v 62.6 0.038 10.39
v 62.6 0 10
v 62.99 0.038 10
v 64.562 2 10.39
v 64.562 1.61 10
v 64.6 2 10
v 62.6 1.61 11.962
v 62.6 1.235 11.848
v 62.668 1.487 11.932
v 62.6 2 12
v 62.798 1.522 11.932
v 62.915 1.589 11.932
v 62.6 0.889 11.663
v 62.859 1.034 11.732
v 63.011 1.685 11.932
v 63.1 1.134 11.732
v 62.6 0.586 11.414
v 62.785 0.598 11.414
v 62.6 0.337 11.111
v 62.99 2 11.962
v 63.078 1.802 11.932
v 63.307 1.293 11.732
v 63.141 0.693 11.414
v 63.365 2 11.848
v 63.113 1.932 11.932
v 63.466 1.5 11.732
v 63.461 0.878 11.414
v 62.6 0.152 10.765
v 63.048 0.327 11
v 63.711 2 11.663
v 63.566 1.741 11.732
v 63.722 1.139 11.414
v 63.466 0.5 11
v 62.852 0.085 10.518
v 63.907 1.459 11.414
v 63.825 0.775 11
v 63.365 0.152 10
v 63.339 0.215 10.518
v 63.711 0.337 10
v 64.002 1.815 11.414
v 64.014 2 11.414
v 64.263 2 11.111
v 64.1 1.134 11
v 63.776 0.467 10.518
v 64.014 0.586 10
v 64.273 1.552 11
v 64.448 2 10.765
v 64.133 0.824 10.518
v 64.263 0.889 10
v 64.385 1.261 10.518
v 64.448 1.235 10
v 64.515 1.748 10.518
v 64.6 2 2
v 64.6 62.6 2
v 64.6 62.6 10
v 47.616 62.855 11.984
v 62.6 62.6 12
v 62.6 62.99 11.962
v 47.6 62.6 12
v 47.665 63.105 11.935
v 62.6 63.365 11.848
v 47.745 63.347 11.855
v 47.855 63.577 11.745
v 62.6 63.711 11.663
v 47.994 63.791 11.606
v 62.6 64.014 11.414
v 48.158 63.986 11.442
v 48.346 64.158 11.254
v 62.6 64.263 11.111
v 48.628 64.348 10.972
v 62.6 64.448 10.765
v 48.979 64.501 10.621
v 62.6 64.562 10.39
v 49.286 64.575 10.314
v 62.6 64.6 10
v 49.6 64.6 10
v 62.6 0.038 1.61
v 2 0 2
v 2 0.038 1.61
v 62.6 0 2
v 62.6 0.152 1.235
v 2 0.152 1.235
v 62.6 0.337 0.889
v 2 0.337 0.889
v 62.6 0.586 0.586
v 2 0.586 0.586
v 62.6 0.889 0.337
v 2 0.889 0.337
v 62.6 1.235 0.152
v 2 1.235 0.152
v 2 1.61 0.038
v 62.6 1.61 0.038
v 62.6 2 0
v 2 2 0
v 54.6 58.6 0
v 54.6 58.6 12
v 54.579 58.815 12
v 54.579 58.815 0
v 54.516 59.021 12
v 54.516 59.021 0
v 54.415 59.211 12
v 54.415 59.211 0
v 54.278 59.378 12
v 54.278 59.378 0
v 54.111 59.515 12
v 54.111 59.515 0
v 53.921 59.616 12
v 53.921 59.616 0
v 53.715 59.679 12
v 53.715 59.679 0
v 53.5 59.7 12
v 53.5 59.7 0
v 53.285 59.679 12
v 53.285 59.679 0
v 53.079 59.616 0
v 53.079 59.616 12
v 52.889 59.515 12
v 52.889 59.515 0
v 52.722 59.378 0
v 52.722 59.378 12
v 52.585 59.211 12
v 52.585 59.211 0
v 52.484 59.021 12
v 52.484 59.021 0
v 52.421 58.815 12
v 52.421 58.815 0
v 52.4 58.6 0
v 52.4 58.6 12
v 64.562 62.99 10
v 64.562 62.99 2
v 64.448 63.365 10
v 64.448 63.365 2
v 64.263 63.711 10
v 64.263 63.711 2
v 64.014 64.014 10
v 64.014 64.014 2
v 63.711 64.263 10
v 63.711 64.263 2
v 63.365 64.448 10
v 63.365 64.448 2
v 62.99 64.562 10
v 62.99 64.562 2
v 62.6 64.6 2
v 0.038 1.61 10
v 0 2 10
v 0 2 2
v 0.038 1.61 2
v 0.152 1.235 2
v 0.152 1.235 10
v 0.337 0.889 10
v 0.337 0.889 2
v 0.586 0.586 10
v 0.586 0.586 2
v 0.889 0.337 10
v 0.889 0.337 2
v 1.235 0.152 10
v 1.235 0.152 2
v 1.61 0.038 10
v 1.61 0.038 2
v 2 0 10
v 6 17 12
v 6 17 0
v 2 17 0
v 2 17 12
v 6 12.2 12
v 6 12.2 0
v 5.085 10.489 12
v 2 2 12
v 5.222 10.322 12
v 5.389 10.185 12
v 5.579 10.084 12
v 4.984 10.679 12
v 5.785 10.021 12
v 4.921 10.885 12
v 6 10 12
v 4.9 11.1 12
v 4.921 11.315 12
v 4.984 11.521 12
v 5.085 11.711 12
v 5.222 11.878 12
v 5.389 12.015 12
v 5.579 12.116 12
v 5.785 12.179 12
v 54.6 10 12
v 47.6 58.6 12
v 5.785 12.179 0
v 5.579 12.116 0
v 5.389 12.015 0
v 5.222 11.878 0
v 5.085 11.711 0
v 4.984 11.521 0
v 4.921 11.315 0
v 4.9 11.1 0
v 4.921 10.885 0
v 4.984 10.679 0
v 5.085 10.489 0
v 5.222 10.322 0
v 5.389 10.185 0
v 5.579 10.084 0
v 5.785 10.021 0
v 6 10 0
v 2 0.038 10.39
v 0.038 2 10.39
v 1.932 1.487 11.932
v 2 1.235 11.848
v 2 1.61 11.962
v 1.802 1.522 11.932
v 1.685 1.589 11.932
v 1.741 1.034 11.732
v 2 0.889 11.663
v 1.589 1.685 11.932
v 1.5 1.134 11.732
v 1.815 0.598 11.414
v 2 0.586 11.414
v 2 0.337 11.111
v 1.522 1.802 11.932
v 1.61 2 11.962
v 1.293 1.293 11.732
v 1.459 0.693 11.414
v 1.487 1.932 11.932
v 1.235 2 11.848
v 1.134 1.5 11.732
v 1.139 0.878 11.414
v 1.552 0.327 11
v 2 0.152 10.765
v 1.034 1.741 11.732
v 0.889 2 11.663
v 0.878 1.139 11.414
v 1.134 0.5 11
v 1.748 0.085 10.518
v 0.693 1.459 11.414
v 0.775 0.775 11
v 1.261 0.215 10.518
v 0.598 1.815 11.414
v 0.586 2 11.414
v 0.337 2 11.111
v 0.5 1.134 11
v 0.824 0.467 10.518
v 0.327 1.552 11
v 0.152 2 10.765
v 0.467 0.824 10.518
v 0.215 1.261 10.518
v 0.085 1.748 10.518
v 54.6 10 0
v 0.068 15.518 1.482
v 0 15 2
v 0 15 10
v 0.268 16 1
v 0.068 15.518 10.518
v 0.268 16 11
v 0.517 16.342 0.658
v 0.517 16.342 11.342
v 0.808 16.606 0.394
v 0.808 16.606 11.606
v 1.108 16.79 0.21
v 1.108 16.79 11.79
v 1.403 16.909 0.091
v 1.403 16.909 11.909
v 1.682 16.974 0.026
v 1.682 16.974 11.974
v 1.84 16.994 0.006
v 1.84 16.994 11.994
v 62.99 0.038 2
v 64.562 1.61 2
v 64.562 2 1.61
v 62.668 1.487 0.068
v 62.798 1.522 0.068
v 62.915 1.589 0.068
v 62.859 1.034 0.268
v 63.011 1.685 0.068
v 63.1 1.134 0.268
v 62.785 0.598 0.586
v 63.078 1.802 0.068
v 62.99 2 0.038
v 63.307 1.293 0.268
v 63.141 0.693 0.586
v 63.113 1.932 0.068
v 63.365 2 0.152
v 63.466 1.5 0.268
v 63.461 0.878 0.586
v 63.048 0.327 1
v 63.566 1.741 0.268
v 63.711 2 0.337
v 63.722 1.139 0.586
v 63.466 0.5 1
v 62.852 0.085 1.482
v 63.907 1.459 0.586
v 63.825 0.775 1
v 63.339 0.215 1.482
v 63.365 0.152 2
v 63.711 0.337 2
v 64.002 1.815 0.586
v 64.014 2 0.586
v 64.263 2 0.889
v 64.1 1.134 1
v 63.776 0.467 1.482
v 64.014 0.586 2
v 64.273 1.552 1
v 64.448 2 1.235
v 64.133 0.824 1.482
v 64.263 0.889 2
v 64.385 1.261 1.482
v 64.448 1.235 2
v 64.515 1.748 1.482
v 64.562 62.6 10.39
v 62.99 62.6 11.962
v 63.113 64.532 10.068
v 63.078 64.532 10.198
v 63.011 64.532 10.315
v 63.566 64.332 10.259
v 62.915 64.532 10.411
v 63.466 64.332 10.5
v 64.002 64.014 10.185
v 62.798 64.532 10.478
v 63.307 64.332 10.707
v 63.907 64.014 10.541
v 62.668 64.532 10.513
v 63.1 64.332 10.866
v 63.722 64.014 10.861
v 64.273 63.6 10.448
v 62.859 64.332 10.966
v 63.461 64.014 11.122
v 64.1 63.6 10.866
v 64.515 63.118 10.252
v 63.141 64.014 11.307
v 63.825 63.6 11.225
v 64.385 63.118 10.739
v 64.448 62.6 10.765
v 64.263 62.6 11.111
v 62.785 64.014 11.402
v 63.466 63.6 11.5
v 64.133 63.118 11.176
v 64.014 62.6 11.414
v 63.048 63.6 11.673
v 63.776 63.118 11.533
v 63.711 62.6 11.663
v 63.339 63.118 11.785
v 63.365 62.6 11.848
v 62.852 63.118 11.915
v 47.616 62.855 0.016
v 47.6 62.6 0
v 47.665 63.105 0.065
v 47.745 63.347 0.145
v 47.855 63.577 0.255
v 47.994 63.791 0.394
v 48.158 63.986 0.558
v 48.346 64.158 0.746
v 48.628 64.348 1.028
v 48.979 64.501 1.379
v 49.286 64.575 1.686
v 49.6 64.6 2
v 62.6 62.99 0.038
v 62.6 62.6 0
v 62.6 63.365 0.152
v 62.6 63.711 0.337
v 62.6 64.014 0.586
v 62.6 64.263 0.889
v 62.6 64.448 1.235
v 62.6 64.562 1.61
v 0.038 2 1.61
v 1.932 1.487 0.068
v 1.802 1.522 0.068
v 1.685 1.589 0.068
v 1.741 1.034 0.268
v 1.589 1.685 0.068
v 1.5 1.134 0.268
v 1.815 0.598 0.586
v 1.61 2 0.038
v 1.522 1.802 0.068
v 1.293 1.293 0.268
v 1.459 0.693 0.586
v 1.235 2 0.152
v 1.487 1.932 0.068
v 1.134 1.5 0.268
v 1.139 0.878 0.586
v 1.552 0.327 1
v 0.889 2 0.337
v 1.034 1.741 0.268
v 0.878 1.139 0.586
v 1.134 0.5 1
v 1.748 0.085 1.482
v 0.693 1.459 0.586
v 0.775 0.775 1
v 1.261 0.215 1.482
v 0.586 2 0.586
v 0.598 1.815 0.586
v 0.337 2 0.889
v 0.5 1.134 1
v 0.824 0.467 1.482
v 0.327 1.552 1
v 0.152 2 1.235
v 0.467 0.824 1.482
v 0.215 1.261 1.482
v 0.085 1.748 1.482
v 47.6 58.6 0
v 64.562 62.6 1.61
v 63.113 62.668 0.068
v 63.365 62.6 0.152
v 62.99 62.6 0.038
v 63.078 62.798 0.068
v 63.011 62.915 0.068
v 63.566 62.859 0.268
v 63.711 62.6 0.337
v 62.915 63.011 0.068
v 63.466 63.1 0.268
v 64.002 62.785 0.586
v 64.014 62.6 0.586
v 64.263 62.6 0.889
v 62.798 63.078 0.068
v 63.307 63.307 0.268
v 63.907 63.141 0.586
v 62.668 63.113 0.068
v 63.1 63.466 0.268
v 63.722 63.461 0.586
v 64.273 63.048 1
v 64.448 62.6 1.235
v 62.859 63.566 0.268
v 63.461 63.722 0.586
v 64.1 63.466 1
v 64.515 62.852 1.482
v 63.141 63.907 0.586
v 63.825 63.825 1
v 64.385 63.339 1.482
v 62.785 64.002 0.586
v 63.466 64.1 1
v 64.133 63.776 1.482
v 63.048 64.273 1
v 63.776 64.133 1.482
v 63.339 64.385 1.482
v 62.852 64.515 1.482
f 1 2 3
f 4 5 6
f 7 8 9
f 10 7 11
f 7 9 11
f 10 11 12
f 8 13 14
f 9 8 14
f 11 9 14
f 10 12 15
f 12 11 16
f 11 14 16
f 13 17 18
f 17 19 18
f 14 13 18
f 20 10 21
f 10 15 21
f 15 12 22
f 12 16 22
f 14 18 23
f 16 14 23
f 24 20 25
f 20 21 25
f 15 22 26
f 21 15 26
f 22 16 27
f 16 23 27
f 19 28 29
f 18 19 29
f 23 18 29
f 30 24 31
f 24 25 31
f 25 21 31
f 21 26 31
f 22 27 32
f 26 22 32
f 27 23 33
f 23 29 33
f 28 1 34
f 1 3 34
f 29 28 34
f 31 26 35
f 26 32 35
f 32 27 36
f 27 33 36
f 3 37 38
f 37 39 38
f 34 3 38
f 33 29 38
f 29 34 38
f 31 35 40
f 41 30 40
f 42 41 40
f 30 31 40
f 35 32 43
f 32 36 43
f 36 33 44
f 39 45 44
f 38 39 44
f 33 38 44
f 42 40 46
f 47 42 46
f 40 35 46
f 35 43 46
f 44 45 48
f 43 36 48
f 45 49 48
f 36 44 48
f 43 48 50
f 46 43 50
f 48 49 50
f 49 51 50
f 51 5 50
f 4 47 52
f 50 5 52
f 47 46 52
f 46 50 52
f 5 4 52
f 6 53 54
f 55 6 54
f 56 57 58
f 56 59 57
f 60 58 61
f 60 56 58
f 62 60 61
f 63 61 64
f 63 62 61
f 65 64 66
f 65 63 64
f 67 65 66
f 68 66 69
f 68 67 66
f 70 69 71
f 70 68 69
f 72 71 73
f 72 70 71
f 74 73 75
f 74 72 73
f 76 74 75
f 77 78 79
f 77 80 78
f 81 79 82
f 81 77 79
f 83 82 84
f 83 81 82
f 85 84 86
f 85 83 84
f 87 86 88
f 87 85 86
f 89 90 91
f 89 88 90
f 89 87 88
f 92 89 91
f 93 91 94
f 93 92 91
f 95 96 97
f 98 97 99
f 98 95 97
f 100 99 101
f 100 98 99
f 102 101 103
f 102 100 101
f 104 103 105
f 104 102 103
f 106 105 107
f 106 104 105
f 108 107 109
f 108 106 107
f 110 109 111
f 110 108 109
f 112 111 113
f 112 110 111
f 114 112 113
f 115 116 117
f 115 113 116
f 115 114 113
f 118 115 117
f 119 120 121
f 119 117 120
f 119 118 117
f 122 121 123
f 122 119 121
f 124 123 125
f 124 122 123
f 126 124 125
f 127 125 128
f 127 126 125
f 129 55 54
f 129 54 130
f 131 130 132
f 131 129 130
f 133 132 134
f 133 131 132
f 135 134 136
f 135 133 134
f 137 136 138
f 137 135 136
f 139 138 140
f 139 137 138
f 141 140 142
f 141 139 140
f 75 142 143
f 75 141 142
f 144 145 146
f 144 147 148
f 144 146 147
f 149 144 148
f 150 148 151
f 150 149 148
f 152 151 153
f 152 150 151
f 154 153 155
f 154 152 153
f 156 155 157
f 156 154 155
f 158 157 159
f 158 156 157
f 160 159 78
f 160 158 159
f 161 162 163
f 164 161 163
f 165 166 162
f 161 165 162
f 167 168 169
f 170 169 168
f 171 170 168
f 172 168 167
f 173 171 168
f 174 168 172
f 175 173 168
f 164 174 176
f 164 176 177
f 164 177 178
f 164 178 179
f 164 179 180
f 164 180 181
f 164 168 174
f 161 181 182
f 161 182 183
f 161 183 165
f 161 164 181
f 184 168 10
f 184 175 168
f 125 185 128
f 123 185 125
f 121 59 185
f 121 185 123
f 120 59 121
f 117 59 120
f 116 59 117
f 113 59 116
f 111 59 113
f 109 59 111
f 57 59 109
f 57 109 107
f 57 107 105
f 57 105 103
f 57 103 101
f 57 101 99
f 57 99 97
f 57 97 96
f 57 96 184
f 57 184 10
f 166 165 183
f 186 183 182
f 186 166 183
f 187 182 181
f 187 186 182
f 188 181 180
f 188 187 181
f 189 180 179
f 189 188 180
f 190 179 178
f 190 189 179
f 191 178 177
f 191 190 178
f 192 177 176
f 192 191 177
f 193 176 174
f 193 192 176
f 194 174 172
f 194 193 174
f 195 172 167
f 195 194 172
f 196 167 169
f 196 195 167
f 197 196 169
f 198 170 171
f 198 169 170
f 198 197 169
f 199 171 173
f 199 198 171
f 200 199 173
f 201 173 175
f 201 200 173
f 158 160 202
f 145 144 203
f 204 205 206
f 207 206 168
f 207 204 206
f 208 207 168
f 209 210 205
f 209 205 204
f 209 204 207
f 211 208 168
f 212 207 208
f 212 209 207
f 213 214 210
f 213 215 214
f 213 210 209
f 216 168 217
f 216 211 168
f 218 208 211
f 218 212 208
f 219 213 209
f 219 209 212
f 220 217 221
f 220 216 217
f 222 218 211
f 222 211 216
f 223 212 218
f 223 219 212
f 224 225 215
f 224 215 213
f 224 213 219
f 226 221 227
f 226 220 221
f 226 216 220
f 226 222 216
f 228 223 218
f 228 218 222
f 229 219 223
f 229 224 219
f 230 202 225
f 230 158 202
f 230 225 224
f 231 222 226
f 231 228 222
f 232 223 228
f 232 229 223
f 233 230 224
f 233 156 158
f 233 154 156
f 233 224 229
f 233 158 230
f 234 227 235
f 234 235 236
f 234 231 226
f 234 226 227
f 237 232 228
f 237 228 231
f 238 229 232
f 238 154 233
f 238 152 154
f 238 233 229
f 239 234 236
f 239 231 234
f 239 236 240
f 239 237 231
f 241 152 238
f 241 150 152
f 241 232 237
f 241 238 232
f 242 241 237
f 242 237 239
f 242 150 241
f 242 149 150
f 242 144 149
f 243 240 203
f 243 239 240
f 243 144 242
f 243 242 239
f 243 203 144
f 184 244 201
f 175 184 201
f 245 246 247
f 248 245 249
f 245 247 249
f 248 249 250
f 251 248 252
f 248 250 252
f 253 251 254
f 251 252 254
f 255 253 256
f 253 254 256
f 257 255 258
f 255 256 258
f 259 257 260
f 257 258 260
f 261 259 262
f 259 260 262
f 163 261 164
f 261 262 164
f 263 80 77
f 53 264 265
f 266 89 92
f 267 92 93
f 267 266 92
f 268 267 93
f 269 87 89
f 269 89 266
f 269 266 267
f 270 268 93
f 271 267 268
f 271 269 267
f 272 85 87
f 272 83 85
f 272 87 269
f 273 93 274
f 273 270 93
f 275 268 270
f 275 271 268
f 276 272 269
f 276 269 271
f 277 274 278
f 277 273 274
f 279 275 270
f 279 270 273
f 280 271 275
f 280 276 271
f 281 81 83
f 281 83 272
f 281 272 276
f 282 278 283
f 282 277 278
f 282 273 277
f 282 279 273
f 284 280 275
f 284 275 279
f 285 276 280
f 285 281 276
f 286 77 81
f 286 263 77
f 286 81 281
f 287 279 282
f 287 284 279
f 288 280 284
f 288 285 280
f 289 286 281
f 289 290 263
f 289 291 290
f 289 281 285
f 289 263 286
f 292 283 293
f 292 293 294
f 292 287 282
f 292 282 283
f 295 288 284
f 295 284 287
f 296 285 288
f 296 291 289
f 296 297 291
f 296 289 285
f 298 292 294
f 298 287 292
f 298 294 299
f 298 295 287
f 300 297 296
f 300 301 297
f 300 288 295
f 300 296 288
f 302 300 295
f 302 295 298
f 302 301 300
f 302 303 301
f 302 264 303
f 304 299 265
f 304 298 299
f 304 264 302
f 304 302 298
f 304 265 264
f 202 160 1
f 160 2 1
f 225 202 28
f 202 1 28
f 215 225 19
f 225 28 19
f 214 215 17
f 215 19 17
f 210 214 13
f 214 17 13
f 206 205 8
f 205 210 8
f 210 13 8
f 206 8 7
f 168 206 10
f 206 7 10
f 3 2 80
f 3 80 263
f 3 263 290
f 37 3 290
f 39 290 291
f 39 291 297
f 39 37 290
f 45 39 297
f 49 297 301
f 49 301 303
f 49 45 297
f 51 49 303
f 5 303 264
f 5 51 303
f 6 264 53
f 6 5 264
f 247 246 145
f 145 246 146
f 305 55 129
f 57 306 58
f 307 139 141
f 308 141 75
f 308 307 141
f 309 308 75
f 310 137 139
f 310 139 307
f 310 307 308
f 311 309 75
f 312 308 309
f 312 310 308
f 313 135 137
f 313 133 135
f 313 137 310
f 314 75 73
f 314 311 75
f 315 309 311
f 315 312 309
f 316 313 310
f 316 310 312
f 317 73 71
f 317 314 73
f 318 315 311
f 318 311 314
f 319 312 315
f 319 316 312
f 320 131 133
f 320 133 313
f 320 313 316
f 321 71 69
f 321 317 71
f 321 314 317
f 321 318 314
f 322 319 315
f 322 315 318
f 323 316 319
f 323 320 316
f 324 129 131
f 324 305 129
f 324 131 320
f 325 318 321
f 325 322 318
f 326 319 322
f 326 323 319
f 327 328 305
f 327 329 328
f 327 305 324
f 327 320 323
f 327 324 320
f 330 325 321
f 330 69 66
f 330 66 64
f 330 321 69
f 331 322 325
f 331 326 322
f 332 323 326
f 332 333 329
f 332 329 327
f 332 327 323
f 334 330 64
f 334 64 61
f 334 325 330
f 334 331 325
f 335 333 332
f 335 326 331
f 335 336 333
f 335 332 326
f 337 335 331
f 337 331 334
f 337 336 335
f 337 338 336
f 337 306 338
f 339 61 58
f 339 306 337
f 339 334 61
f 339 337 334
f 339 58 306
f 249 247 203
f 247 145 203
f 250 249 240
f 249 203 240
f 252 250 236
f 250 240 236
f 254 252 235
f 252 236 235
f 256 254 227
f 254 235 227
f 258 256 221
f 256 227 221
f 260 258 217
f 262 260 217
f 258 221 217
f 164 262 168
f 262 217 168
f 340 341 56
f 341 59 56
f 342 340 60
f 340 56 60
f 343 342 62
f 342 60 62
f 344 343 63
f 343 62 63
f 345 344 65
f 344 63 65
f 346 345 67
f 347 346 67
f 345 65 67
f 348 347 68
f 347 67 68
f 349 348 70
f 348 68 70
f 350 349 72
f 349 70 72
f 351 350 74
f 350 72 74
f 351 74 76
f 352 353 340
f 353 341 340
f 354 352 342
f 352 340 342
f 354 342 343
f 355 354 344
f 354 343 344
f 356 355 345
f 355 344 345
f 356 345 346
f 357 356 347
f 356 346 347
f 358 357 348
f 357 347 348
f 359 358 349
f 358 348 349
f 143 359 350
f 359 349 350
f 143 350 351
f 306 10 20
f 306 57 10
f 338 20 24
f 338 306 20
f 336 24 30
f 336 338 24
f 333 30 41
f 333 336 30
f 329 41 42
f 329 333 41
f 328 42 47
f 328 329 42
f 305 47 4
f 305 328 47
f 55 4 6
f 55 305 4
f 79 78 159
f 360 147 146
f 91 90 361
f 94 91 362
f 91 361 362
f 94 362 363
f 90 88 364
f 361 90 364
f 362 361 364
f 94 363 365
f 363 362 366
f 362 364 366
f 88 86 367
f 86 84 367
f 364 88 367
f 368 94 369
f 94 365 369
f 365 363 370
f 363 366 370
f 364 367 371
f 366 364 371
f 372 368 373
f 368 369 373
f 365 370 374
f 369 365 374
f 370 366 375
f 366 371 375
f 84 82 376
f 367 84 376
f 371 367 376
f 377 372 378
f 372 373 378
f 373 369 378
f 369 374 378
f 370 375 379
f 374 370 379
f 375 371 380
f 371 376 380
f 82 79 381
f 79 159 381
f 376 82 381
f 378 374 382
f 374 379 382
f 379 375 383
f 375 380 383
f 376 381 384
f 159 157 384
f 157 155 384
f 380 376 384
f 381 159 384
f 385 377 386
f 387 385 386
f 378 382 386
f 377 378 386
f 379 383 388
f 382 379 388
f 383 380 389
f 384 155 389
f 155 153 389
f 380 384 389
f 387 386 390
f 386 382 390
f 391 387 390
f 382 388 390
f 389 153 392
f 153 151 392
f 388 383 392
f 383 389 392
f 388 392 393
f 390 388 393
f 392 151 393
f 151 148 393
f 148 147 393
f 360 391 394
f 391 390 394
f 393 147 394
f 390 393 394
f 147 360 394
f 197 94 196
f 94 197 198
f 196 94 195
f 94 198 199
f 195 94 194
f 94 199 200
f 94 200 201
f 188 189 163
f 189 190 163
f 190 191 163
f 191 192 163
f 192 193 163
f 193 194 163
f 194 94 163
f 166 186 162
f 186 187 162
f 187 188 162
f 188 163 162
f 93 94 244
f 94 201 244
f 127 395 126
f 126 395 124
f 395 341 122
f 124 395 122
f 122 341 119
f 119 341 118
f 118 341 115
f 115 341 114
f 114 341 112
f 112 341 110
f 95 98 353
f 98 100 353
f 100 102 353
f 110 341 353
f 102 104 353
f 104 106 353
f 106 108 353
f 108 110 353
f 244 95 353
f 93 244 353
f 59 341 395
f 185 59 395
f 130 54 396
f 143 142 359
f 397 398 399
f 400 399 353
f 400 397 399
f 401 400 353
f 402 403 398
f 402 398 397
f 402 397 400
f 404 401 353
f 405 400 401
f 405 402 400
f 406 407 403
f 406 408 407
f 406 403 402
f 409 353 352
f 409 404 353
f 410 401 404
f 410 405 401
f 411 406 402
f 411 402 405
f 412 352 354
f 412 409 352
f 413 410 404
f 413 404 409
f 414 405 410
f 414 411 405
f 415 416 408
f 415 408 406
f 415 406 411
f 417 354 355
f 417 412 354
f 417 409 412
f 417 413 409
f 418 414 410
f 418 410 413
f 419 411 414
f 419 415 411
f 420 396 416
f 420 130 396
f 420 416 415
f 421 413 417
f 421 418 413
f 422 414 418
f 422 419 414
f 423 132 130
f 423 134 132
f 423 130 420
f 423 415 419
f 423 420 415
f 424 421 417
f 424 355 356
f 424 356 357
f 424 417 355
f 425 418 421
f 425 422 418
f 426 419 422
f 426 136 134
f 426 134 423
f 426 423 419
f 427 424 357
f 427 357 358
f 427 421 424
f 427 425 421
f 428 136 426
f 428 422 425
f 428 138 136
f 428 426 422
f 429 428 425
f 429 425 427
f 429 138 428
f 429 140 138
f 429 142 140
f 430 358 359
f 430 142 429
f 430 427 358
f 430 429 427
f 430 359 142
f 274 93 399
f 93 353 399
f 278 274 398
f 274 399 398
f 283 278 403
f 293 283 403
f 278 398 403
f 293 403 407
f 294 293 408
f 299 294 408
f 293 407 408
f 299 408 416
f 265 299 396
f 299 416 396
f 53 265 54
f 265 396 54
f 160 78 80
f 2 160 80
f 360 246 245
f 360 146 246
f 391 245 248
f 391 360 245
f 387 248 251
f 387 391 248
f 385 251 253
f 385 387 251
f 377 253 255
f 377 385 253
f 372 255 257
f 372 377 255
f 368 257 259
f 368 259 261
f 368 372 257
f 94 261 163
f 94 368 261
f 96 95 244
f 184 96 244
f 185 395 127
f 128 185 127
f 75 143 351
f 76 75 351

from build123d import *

# Parameters (mm, degrees)
F1_DEPTH = 12
F2_R     = 1.1
F3_DEPTH = 12.001
F4_R     = 2


with BuildPart() as f1:
    # F0 (on Top) → F1 (new body)
    with BuildSketch(Plane.XY):
        Polygon((0, 17), (0, 0), (64.6, 0), (64.6, 58.6), (64.6, 64.6), (47.6, 64.6), (47.6, 58.6), (54.6, 58.6), (54.6, 10), (6, 10), (6, 17), align=None)
    extrude(amount=F1_DEPTH)

    # F2 (on Top) → F3 (cut, through all)
    with BuildSketch(Plane.XY):
        with Locations((6, 11.1)):
            Circle(F2_R)
        with Locations((53.5, 58.6)):
            Circle(F2_R)
    extrude(amount=F3_DEPTH, mode=Mode.SUBTRACT)

    # F4
    f4_edges = [f1.edges().sort_by_distance(p)[0] for p in [
        (0, 0, 6),
        (64.6, 0, 6),
        (32.3, 0, 0),
        (32.3, 0, 12),
        (0, 17, 6),
        (0, 8.5, 0),
        (0, 8.5, 12),
        (64.6, 32.3, 12),
        (64.6, 64.6, 6),
        (64.6, 32.3, 0),
        (47.6, 64.6, 6),
        (56.1, 64.6, 0),
        (56.1, 64.6, 12),
    ]]
    fillet(f4_edges, radius=F4_R)


solid = f1.part
